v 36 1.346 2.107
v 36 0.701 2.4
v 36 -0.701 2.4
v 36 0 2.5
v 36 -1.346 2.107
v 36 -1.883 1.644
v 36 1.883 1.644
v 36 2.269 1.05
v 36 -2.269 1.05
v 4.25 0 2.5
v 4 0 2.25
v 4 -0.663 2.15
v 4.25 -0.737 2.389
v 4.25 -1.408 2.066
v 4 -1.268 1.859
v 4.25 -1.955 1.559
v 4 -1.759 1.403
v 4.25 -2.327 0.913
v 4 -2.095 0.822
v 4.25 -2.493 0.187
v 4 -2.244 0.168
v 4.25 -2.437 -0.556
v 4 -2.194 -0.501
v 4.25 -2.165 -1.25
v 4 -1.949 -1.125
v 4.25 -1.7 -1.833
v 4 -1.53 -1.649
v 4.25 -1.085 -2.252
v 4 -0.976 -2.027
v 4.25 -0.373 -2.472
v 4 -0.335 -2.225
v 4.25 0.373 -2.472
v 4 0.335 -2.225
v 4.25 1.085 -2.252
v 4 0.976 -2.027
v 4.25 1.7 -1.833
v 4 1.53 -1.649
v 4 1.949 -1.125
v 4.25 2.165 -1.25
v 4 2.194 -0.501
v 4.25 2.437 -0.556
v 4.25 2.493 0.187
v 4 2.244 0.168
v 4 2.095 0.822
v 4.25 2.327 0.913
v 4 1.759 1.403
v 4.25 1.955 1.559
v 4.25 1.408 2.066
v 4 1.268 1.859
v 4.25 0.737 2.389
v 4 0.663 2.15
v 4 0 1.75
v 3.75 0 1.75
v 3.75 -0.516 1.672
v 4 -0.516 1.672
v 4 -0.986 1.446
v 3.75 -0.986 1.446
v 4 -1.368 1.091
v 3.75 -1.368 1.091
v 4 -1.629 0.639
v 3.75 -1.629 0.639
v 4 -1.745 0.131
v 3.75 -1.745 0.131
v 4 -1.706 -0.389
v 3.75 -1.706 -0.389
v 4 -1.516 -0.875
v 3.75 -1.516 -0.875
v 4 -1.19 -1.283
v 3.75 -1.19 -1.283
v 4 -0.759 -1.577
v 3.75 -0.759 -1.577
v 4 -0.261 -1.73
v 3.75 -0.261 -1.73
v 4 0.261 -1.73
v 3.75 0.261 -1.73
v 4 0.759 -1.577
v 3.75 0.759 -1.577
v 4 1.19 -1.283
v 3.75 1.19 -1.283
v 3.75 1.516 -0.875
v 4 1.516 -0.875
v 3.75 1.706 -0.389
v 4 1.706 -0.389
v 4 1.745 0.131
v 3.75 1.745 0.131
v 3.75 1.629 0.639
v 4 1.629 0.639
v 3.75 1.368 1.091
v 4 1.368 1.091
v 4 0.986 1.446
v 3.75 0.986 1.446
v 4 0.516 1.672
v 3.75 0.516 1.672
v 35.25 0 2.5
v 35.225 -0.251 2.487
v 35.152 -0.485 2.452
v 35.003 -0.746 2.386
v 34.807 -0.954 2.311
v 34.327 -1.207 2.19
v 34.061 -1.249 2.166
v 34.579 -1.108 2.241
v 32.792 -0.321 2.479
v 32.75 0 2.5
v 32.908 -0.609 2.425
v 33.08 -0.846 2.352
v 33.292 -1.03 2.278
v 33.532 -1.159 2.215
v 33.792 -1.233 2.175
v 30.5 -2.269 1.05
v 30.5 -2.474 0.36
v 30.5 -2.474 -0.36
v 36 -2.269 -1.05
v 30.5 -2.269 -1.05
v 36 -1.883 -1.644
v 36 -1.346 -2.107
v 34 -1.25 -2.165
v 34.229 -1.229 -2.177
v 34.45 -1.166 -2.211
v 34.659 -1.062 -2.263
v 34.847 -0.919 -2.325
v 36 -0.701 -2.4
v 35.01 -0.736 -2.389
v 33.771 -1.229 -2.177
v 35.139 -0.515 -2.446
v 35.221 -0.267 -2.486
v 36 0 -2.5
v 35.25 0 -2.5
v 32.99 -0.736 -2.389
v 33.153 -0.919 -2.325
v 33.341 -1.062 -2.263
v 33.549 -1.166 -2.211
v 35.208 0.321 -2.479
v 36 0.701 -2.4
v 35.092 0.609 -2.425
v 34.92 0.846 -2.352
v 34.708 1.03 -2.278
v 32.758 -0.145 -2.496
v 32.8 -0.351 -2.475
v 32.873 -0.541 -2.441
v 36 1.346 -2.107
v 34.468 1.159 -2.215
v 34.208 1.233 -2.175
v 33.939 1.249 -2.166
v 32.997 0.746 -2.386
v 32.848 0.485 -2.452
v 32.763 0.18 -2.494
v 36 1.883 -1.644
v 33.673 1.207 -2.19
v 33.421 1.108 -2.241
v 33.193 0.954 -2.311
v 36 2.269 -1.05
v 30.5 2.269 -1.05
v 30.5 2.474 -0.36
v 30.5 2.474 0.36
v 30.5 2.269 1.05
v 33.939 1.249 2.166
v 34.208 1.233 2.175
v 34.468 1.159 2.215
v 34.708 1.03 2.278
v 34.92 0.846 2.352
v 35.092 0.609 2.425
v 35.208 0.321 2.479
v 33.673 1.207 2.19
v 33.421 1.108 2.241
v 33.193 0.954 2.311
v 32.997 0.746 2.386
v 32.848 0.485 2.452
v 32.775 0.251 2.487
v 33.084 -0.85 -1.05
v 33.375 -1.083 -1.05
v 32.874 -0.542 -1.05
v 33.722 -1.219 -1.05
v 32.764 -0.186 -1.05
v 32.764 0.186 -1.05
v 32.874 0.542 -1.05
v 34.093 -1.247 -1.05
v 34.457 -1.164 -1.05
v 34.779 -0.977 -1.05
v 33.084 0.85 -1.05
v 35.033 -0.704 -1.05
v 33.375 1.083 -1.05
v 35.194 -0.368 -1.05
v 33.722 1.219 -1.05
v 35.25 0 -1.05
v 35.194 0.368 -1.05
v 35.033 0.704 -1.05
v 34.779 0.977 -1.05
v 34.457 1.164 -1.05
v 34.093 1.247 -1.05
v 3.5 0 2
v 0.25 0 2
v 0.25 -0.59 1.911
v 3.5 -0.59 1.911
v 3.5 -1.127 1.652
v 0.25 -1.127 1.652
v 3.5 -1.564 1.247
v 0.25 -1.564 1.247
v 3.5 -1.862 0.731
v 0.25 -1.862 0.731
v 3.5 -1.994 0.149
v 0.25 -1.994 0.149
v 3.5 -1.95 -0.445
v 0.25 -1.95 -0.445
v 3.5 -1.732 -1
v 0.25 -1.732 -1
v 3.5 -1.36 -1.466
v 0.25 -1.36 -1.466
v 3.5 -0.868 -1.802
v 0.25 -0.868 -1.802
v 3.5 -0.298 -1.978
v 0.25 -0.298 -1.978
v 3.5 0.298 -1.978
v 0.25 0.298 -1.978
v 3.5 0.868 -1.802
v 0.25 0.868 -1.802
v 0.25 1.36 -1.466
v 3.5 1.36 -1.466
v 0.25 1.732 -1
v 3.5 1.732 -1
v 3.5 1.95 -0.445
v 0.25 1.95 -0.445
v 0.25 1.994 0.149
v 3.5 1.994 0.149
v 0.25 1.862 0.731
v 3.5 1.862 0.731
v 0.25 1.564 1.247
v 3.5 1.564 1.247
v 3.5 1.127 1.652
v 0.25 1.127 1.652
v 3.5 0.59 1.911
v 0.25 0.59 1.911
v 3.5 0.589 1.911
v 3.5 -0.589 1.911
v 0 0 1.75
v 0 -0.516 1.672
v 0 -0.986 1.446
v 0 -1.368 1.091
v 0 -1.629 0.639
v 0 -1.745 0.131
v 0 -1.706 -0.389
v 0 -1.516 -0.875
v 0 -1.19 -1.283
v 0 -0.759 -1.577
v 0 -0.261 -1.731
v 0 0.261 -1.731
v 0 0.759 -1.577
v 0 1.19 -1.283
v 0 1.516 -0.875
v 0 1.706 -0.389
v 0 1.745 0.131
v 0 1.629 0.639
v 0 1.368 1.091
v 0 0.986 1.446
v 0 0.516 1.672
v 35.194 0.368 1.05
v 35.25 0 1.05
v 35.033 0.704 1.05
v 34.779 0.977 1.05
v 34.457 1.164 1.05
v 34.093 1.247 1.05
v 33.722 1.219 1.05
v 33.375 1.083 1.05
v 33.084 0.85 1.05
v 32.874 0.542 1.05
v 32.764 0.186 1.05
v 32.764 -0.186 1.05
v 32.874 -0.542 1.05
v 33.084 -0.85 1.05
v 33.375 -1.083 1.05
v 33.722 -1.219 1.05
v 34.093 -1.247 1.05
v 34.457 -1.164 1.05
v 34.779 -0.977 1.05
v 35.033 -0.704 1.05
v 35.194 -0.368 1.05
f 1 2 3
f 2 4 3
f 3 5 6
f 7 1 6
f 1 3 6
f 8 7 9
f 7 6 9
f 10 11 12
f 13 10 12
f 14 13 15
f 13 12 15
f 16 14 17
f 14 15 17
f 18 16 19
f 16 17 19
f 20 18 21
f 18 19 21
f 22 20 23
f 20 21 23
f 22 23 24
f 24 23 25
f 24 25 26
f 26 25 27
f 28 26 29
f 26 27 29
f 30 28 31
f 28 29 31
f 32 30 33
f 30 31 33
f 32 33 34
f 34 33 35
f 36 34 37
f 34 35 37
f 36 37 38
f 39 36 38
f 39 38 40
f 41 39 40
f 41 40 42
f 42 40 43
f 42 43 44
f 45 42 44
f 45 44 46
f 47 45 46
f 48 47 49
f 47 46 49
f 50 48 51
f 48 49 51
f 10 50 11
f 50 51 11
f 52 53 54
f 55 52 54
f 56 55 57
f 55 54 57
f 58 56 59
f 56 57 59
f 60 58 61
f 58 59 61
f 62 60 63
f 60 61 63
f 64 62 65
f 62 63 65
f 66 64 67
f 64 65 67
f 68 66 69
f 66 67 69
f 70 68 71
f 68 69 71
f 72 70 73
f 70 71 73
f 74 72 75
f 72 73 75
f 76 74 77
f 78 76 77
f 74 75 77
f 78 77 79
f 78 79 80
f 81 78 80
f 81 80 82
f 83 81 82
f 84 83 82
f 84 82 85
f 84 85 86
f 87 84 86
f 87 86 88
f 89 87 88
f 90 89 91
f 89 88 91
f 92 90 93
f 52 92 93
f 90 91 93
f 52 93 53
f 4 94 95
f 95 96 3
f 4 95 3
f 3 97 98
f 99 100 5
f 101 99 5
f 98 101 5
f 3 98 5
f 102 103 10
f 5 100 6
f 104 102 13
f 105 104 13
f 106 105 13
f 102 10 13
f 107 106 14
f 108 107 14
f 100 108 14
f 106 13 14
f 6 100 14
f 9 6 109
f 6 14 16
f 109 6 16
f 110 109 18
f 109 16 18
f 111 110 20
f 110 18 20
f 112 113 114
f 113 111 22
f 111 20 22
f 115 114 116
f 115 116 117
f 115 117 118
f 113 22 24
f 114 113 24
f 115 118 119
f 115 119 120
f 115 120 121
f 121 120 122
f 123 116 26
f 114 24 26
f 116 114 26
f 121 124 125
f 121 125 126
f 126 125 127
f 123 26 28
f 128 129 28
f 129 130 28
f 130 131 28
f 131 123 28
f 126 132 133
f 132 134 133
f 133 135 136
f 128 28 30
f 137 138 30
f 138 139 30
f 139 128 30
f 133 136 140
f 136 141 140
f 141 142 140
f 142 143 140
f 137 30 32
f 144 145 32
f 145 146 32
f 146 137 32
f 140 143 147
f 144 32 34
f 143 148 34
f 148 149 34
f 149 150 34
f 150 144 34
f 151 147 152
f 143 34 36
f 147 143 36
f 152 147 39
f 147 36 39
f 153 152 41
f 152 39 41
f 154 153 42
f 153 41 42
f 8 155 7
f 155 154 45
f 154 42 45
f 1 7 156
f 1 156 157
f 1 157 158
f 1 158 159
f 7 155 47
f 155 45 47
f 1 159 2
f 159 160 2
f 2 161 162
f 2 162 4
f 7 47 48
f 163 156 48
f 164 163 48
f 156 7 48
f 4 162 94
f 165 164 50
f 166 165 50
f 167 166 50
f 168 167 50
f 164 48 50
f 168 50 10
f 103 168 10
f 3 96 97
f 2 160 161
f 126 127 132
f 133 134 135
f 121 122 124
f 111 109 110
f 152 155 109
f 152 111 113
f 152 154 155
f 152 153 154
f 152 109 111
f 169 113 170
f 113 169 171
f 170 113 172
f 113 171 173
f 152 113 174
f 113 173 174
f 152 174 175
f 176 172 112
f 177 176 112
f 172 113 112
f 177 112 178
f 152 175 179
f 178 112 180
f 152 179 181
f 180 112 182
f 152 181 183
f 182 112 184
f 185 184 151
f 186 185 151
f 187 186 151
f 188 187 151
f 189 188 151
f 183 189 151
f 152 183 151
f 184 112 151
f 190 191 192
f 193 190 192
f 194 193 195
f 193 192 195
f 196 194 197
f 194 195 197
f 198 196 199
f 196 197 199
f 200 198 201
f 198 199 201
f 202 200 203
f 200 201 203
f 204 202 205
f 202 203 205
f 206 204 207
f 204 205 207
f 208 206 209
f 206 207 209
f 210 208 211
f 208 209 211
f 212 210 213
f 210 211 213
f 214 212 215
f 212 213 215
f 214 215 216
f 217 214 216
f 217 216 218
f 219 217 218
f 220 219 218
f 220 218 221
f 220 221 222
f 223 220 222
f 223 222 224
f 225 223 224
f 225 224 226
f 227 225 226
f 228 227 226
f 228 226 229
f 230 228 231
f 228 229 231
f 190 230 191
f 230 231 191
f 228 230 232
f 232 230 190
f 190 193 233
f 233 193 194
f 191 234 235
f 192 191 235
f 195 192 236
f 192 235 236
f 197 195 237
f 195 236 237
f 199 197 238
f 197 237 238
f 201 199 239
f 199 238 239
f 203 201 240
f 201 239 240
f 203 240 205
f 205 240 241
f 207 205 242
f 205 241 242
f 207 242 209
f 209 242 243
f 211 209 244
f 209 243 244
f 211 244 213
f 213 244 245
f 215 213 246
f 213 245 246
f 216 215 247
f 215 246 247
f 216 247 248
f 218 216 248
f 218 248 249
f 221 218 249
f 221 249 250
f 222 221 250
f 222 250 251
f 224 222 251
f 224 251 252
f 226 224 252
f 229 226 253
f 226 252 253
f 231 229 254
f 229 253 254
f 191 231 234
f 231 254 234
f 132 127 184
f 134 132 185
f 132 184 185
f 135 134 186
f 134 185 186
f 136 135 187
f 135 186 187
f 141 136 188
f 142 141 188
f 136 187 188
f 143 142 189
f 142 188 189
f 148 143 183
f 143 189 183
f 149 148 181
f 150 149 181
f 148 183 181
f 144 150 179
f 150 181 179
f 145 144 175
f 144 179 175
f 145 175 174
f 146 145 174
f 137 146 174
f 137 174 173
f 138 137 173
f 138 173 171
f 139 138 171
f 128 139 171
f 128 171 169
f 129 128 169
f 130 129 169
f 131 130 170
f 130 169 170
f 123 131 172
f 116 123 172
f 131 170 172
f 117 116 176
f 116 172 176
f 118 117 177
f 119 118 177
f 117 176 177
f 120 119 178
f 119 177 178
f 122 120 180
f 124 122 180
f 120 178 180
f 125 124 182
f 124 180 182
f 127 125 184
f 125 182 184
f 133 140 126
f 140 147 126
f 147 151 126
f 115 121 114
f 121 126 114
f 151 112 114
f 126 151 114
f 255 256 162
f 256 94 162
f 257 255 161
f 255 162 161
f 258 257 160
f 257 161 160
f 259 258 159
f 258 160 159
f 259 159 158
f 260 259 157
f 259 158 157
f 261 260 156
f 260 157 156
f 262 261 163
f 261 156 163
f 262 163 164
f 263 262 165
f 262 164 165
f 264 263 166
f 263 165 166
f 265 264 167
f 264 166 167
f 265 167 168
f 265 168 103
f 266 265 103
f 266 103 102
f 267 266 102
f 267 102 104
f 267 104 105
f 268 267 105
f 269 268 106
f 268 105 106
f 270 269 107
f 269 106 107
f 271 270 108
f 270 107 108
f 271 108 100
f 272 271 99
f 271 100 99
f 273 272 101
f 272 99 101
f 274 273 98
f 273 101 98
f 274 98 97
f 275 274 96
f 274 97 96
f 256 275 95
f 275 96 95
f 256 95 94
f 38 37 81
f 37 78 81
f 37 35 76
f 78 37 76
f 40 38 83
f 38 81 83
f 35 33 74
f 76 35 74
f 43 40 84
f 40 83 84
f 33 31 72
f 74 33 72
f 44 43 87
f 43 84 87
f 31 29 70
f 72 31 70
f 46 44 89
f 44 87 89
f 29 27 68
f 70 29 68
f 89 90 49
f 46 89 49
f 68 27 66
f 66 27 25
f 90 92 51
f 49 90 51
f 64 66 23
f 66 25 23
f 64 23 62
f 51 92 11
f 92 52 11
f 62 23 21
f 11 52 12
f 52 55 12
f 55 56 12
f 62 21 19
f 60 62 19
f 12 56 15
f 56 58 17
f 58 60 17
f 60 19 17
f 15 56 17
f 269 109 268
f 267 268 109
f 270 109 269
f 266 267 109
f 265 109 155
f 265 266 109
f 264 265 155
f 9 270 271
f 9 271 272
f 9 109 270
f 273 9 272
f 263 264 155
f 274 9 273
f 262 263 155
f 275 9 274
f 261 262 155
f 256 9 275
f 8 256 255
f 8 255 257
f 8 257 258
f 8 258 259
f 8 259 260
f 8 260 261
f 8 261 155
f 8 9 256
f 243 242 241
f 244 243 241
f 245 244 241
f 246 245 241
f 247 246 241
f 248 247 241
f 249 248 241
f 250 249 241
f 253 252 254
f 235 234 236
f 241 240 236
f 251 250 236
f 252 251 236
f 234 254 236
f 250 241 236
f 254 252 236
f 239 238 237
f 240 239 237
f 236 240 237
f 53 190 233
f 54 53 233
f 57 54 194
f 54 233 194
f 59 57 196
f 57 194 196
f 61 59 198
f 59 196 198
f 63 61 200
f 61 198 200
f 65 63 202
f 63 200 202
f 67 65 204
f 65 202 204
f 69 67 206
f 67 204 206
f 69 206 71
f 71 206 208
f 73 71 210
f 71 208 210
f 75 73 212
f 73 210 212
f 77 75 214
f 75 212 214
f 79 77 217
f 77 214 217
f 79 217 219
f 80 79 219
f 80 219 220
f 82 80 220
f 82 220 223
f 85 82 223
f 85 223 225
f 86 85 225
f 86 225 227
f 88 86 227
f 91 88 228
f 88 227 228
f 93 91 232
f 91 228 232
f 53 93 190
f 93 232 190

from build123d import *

# Parameters (mm, degrees)
SKETCH2_R          = 1.25
CUT_EXTRUDE1_DEPTH = 5
SKETCH3_W          = 2.1
SKETCH3_H          = 11.085015624
CUT_EXTRUDE2_DEPTH = 5.5
CHAMFER1_SIZE      = 0.25


with BuildPart() as part:
    # Sketch1 → Revolve1 (revolve)
    with BuildSketch(Plane.XY, mode=Mode.PRIVATE) as revolve1_sk:
        Polygon((0, 0), (36, 0), (36, -2.5), (4, -2.5), (4, -1.75), (3.5, -1.75), (3.5, -2), (0, -2), align=None)
    revolve(revolve1_sk.sketch.rotate(Axis((0, 0, 0), (1, 0, 0)), 270), axis=Axis((0, 0, 0), (1, 0, 0)))

    # Sketch2 → Cut-Extrude1 (cut, symmetric)
    with BuildSketch(Plane.XY):
        with Locations((34, 0)):
            Circle(SKETCH2_R)
    extrude(amount=CUT_EXTRUDE1_DEPTH, both=True, mode=Mode.SUBTRACT)

    # Sketch3 → Cut-Extrude2 (cut)
    with BuildSketch(Plane(origin=(36, 0, 0), x_dir=(0, 0, -1), z_dir=(1, 0, 0))):
        Rectangle(SKETCH3_W, SKETCH3_H)
    extrude(amount=-CUT_EXTRUDE2_DEPTH, mode=Mode.SUBTRACT)

    # Chamfer1
    chamfer1_edges = [part.edges().sort_by_distance(p)[0] for p in [
        (0, 0, -2),
        (4, 0, -2.5),
        (3.5, 0, -1.75),
    ]]
    chamfer(chamfer1_edges, length=CHAMFER1_SIZE - 0.0001)  # a hair under: the kernel refuses the full size


solid = part.part
